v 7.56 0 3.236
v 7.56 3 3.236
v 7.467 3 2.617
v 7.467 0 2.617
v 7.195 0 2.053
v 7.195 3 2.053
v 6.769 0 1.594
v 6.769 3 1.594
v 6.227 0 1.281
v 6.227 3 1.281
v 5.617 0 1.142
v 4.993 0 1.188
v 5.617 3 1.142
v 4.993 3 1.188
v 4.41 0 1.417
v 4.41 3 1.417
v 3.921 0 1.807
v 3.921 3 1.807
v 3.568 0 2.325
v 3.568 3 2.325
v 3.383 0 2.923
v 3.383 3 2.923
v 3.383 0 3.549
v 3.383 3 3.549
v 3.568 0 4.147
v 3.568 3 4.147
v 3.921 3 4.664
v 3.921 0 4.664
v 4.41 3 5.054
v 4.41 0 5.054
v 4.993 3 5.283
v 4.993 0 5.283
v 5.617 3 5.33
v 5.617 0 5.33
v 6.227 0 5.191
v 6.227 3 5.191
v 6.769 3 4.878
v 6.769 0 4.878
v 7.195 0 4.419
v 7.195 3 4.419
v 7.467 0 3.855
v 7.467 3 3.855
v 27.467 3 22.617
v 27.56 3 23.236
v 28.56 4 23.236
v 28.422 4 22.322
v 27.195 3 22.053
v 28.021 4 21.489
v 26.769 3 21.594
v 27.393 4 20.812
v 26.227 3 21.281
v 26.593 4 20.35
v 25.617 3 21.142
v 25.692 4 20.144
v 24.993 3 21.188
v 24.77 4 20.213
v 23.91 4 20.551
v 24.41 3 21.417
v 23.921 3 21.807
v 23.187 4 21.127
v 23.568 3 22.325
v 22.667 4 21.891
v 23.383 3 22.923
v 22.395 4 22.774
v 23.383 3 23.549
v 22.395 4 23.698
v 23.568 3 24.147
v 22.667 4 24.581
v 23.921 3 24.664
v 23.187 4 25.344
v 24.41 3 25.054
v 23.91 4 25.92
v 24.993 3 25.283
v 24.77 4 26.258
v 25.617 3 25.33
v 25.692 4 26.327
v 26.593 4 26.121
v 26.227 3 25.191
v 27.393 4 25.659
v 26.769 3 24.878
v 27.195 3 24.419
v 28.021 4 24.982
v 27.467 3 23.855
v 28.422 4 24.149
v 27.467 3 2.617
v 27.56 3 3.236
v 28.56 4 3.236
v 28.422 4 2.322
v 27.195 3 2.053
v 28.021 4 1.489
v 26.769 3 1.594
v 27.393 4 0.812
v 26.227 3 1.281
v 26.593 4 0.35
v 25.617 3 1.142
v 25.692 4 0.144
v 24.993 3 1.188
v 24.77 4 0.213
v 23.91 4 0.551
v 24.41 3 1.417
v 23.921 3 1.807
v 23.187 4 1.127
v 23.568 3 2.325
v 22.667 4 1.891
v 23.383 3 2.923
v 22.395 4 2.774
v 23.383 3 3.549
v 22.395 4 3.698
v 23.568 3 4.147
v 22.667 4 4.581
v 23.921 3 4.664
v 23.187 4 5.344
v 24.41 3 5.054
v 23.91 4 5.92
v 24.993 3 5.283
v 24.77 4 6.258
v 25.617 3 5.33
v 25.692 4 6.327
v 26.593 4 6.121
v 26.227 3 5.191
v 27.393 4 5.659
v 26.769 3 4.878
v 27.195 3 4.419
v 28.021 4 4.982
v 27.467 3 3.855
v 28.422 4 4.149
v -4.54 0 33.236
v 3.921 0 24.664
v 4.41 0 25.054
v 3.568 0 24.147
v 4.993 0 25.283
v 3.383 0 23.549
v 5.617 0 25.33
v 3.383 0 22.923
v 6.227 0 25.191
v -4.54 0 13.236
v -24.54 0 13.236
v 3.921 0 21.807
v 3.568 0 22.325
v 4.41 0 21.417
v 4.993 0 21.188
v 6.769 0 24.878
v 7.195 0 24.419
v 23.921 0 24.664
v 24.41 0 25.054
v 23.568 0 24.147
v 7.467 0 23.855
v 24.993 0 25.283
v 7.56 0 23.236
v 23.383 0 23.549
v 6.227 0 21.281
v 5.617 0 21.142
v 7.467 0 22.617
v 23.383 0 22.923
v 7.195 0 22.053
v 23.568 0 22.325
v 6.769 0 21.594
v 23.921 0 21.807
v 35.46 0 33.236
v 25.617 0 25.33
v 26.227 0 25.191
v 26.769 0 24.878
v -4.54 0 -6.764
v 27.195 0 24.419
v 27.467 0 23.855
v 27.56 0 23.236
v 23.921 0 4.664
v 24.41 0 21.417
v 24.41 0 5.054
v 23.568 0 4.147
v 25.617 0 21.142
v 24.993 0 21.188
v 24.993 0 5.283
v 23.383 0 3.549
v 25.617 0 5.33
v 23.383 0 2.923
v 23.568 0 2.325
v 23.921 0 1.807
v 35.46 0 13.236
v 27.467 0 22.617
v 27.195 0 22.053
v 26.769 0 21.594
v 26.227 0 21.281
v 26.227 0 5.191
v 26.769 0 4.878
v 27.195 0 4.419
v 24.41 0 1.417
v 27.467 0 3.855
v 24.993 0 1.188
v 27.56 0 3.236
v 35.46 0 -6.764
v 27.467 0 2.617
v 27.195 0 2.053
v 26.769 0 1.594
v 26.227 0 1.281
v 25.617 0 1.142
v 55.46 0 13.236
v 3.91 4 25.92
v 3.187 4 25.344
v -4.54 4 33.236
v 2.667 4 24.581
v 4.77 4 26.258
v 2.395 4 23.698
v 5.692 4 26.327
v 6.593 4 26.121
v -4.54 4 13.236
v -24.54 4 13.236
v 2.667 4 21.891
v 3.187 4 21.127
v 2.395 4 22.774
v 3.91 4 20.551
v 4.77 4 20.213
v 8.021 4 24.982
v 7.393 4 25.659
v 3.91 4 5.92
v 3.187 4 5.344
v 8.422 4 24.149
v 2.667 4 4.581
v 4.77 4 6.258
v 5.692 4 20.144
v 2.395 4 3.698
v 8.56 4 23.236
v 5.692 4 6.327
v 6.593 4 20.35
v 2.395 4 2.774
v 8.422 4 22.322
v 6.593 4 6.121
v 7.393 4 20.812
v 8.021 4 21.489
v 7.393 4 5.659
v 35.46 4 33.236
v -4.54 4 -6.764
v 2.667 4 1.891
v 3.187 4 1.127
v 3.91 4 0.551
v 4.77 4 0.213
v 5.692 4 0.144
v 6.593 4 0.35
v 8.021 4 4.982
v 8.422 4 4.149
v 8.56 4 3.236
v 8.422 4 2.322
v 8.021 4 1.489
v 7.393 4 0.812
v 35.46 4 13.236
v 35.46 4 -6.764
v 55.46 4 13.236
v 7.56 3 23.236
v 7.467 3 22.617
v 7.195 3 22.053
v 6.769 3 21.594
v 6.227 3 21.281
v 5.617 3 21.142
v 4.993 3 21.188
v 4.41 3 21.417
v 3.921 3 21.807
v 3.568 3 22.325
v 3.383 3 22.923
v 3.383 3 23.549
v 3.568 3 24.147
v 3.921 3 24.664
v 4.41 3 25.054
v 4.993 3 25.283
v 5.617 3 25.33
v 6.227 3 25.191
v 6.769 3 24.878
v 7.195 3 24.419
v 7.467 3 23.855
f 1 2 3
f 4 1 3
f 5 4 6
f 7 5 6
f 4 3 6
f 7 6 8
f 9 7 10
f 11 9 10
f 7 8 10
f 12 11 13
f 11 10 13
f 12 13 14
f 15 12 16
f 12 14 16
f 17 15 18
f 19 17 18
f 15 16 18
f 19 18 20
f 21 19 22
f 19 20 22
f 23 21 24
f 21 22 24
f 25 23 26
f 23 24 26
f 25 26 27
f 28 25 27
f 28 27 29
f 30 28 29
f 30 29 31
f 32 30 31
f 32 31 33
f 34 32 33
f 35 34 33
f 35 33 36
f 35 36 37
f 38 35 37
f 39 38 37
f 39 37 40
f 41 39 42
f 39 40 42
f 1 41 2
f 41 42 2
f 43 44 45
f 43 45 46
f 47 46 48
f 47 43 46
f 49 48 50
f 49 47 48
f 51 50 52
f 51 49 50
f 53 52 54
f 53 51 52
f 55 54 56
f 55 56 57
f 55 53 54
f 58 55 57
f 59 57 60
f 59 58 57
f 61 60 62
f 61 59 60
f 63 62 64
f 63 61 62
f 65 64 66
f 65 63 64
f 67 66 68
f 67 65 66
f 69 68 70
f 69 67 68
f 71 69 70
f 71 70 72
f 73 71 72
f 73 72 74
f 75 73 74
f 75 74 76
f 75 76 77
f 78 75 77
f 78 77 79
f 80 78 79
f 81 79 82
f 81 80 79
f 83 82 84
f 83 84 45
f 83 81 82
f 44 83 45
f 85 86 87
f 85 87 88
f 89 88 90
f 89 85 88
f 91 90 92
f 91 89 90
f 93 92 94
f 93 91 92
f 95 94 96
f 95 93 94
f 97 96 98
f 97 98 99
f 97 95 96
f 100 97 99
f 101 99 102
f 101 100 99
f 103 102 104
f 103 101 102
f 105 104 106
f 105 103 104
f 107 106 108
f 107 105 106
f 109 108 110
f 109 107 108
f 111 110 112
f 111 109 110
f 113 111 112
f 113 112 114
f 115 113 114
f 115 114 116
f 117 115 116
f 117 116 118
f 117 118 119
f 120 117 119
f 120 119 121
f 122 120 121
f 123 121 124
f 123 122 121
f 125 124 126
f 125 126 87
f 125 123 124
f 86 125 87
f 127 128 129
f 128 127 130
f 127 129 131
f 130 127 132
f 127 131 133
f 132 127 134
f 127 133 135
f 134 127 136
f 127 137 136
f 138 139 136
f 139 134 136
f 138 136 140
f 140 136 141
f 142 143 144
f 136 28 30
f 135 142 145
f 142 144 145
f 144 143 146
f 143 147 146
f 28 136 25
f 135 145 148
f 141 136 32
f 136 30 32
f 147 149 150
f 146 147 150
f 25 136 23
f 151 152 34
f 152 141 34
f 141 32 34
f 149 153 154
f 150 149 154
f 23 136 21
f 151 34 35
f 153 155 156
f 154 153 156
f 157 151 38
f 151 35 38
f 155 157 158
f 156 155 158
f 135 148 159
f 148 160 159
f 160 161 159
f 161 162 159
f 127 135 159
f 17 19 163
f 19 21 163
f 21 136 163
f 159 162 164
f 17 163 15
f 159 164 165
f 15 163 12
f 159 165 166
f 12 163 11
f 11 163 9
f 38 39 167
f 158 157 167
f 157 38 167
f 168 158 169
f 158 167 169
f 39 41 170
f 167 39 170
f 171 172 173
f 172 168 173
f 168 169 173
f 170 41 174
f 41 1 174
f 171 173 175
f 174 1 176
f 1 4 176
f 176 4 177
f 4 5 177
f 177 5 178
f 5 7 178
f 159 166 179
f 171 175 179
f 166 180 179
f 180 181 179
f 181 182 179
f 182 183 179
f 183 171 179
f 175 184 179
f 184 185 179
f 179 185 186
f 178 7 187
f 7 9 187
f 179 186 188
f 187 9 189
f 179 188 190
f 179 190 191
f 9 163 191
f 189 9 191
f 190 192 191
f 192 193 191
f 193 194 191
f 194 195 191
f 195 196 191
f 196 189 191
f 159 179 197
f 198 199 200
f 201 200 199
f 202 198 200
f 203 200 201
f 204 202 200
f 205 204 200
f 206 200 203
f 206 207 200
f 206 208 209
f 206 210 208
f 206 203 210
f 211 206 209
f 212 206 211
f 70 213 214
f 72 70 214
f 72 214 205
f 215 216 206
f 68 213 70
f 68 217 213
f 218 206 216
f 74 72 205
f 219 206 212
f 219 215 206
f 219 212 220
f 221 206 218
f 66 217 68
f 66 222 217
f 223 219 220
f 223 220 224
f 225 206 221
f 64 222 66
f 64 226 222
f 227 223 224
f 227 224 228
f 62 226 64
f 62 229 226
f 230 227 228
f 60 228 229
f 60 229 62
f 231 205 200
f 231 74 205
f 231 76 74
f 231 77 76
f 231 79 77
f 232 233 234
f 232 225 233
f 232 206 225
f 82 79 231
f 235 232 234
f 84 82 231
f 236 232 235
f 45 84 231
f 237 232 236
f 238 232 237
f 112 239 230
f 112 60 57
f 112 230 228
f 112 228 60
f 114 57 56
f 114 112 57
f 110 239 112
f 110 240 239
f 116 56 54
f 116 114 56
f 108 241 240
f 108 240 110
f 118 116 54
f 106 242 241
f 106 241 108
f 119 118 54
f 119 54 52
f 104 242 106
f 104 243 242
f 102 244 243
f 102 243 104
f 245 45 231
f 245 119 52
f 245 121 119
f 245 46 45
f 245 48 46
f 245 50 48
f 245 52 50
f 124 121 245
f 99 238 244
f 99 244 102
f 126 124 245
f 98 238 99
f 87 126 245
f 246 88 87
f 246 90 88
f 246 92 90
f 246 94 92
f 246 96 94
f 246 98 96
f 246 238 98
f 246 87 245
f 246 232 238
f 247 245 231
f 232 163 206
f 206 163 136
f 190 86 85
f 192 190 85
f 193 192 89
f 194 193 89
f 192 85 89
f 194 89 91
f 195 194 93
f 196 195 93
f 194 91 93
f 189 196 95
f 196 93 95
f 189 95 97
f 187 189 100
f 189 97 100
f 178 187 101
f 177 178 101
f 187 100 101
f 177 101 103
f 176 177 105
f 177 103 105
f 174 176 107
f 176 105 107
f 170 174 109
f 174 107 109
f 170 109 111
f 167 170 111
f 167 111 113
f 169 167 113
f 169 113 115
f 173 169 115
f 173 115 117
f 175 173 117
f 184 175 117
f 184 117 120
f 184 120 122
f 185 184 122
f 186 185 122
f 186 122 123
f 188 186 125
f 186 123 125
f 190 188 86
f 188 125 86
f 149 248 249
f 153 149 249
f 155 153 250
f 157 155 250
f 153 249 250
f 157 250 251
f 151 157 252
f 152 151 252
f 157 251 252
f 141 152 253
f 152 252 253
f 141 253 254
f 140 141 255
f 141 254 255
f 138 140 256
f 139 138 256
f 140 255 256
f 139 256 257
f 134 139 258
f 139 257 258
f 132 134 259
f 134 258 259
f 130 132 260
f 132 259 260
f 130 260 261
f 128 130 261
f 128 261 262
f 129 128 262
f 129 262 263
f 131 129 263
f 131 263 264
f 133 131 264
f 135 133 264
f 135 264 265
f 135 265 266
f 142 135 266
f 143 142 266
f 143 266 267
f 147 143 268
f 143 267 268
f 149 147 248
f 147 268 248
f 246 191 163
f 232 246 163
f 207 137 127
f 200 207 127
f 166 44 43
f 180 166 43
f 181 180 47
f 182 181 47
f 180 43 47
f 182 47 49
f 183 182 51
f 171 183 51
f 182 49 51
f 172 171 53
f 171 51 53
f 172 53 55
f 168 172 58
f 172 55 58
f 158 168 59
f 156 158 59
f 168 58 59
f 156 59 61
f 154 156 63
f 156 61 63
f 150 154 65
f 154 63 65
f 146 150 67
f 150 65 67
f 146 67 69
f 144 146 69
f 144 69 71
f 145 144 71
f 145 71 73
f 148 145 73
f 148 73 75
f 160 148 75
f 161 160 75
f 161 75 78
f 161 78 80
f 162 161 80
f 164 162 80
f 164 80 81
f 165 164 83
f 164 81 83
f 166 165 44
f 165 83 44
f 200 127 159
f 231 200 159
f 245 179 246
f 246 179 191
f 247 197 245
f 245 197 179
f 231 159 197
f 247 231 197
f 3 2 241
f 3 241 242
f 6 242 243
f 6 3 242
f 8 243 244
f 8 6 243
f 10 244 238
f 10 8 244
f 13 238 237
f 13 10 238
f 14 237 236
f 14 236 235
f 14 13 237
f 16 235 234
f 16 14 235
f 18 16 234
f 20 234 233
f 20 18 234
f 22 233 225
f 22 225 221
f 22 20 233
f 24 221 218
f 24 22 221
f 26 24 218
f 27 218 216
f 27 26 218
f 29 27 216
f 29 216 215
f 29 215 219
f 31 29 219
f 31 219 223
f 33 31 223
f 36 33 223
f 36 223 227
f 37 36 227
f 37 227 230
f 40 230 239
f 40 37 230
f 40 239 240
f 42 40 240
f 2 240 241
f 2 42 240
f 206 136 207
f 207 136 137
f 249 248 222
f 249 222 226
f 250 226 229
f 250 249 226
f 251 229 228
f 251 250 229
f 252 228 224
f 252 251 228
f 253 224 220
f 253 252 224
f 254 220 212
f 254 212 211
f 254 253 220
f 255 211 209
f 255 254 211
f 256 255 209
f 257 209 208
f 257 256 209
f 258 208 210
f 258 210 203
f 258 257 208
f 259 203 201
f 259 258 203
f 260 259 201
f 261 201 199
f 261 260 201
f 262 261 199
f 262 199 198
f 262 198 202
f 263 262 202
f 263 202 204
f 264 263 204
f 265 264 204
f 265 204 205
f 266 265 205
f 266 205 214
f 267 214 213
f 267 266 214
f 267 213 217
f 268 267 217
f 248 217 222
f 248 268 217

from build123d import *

# Parameters (mm, degrees)
BOSS_EXTRUDE1_DEPTH = 4
SKETCH2_R           = 2.1
CUT_EXTRUDE1_DEPTH  = 4
CHAMFER1_SIZE       = 1


with BuildPart() as part:
    # Sketch1 → Boss-Extrude1 (new body)
    with BuildSketch(Plane(origin=(0, 0, 0), x_dir=(1, 0, 0), z_dir=(0, 1, 0))):
        Polygon((-4.540045767, -33.235697941), (35.459954233, -33.235697941), (55.459954233, -13.235697941), (35.459954233, -13.235697941), (35.459954233, 6.764302059), (-4.540045767, 6.764302059), (-4.540045767, -13.235697941), (-24.540045767, -13.235697941), align=None)
    extrude(amount=BOSS_EXTRUDE1_DEPTH)

    # Sketch2 → Cut-Extrude1 (cut)
    with BuildSketch(Plane(origin=(0, 4, 0), x_dir=(1, 0, 0), z_dir=(0, 1, 0))):
        with Locations((5.459954233, -23.235697941)):
            Circle(SKETCH2_R)
        with Locations((25.459954233, -23.235697941)):
            Circle(SKETCH2_R)
        with Locations((25.459954233, -3.235697941)):
            Circle(SKETCH2_R)
        with Locations((5.459954233, -3.235697941)):
            Circle(SKETCH2_R)
    extrude(amount=-CUT_EXTRUDE1_DEPTH, mode=Mode.SUBTRACT)

    # Chamfer1
    chamfer1_edges = [part.edges().sort_by_distance(p)[0] for p in [
        (3.359954233, 4, 3.235697941),
        (23.359954233, 4, 3.235697941),
        (23.359954233, 4, 23.235697941),
        (3.359954233, 4, 23.235697941),
    ]]
    chamfer(chamfer1_edges, length=CHAMFER1_SIZE)


solid = part.part
